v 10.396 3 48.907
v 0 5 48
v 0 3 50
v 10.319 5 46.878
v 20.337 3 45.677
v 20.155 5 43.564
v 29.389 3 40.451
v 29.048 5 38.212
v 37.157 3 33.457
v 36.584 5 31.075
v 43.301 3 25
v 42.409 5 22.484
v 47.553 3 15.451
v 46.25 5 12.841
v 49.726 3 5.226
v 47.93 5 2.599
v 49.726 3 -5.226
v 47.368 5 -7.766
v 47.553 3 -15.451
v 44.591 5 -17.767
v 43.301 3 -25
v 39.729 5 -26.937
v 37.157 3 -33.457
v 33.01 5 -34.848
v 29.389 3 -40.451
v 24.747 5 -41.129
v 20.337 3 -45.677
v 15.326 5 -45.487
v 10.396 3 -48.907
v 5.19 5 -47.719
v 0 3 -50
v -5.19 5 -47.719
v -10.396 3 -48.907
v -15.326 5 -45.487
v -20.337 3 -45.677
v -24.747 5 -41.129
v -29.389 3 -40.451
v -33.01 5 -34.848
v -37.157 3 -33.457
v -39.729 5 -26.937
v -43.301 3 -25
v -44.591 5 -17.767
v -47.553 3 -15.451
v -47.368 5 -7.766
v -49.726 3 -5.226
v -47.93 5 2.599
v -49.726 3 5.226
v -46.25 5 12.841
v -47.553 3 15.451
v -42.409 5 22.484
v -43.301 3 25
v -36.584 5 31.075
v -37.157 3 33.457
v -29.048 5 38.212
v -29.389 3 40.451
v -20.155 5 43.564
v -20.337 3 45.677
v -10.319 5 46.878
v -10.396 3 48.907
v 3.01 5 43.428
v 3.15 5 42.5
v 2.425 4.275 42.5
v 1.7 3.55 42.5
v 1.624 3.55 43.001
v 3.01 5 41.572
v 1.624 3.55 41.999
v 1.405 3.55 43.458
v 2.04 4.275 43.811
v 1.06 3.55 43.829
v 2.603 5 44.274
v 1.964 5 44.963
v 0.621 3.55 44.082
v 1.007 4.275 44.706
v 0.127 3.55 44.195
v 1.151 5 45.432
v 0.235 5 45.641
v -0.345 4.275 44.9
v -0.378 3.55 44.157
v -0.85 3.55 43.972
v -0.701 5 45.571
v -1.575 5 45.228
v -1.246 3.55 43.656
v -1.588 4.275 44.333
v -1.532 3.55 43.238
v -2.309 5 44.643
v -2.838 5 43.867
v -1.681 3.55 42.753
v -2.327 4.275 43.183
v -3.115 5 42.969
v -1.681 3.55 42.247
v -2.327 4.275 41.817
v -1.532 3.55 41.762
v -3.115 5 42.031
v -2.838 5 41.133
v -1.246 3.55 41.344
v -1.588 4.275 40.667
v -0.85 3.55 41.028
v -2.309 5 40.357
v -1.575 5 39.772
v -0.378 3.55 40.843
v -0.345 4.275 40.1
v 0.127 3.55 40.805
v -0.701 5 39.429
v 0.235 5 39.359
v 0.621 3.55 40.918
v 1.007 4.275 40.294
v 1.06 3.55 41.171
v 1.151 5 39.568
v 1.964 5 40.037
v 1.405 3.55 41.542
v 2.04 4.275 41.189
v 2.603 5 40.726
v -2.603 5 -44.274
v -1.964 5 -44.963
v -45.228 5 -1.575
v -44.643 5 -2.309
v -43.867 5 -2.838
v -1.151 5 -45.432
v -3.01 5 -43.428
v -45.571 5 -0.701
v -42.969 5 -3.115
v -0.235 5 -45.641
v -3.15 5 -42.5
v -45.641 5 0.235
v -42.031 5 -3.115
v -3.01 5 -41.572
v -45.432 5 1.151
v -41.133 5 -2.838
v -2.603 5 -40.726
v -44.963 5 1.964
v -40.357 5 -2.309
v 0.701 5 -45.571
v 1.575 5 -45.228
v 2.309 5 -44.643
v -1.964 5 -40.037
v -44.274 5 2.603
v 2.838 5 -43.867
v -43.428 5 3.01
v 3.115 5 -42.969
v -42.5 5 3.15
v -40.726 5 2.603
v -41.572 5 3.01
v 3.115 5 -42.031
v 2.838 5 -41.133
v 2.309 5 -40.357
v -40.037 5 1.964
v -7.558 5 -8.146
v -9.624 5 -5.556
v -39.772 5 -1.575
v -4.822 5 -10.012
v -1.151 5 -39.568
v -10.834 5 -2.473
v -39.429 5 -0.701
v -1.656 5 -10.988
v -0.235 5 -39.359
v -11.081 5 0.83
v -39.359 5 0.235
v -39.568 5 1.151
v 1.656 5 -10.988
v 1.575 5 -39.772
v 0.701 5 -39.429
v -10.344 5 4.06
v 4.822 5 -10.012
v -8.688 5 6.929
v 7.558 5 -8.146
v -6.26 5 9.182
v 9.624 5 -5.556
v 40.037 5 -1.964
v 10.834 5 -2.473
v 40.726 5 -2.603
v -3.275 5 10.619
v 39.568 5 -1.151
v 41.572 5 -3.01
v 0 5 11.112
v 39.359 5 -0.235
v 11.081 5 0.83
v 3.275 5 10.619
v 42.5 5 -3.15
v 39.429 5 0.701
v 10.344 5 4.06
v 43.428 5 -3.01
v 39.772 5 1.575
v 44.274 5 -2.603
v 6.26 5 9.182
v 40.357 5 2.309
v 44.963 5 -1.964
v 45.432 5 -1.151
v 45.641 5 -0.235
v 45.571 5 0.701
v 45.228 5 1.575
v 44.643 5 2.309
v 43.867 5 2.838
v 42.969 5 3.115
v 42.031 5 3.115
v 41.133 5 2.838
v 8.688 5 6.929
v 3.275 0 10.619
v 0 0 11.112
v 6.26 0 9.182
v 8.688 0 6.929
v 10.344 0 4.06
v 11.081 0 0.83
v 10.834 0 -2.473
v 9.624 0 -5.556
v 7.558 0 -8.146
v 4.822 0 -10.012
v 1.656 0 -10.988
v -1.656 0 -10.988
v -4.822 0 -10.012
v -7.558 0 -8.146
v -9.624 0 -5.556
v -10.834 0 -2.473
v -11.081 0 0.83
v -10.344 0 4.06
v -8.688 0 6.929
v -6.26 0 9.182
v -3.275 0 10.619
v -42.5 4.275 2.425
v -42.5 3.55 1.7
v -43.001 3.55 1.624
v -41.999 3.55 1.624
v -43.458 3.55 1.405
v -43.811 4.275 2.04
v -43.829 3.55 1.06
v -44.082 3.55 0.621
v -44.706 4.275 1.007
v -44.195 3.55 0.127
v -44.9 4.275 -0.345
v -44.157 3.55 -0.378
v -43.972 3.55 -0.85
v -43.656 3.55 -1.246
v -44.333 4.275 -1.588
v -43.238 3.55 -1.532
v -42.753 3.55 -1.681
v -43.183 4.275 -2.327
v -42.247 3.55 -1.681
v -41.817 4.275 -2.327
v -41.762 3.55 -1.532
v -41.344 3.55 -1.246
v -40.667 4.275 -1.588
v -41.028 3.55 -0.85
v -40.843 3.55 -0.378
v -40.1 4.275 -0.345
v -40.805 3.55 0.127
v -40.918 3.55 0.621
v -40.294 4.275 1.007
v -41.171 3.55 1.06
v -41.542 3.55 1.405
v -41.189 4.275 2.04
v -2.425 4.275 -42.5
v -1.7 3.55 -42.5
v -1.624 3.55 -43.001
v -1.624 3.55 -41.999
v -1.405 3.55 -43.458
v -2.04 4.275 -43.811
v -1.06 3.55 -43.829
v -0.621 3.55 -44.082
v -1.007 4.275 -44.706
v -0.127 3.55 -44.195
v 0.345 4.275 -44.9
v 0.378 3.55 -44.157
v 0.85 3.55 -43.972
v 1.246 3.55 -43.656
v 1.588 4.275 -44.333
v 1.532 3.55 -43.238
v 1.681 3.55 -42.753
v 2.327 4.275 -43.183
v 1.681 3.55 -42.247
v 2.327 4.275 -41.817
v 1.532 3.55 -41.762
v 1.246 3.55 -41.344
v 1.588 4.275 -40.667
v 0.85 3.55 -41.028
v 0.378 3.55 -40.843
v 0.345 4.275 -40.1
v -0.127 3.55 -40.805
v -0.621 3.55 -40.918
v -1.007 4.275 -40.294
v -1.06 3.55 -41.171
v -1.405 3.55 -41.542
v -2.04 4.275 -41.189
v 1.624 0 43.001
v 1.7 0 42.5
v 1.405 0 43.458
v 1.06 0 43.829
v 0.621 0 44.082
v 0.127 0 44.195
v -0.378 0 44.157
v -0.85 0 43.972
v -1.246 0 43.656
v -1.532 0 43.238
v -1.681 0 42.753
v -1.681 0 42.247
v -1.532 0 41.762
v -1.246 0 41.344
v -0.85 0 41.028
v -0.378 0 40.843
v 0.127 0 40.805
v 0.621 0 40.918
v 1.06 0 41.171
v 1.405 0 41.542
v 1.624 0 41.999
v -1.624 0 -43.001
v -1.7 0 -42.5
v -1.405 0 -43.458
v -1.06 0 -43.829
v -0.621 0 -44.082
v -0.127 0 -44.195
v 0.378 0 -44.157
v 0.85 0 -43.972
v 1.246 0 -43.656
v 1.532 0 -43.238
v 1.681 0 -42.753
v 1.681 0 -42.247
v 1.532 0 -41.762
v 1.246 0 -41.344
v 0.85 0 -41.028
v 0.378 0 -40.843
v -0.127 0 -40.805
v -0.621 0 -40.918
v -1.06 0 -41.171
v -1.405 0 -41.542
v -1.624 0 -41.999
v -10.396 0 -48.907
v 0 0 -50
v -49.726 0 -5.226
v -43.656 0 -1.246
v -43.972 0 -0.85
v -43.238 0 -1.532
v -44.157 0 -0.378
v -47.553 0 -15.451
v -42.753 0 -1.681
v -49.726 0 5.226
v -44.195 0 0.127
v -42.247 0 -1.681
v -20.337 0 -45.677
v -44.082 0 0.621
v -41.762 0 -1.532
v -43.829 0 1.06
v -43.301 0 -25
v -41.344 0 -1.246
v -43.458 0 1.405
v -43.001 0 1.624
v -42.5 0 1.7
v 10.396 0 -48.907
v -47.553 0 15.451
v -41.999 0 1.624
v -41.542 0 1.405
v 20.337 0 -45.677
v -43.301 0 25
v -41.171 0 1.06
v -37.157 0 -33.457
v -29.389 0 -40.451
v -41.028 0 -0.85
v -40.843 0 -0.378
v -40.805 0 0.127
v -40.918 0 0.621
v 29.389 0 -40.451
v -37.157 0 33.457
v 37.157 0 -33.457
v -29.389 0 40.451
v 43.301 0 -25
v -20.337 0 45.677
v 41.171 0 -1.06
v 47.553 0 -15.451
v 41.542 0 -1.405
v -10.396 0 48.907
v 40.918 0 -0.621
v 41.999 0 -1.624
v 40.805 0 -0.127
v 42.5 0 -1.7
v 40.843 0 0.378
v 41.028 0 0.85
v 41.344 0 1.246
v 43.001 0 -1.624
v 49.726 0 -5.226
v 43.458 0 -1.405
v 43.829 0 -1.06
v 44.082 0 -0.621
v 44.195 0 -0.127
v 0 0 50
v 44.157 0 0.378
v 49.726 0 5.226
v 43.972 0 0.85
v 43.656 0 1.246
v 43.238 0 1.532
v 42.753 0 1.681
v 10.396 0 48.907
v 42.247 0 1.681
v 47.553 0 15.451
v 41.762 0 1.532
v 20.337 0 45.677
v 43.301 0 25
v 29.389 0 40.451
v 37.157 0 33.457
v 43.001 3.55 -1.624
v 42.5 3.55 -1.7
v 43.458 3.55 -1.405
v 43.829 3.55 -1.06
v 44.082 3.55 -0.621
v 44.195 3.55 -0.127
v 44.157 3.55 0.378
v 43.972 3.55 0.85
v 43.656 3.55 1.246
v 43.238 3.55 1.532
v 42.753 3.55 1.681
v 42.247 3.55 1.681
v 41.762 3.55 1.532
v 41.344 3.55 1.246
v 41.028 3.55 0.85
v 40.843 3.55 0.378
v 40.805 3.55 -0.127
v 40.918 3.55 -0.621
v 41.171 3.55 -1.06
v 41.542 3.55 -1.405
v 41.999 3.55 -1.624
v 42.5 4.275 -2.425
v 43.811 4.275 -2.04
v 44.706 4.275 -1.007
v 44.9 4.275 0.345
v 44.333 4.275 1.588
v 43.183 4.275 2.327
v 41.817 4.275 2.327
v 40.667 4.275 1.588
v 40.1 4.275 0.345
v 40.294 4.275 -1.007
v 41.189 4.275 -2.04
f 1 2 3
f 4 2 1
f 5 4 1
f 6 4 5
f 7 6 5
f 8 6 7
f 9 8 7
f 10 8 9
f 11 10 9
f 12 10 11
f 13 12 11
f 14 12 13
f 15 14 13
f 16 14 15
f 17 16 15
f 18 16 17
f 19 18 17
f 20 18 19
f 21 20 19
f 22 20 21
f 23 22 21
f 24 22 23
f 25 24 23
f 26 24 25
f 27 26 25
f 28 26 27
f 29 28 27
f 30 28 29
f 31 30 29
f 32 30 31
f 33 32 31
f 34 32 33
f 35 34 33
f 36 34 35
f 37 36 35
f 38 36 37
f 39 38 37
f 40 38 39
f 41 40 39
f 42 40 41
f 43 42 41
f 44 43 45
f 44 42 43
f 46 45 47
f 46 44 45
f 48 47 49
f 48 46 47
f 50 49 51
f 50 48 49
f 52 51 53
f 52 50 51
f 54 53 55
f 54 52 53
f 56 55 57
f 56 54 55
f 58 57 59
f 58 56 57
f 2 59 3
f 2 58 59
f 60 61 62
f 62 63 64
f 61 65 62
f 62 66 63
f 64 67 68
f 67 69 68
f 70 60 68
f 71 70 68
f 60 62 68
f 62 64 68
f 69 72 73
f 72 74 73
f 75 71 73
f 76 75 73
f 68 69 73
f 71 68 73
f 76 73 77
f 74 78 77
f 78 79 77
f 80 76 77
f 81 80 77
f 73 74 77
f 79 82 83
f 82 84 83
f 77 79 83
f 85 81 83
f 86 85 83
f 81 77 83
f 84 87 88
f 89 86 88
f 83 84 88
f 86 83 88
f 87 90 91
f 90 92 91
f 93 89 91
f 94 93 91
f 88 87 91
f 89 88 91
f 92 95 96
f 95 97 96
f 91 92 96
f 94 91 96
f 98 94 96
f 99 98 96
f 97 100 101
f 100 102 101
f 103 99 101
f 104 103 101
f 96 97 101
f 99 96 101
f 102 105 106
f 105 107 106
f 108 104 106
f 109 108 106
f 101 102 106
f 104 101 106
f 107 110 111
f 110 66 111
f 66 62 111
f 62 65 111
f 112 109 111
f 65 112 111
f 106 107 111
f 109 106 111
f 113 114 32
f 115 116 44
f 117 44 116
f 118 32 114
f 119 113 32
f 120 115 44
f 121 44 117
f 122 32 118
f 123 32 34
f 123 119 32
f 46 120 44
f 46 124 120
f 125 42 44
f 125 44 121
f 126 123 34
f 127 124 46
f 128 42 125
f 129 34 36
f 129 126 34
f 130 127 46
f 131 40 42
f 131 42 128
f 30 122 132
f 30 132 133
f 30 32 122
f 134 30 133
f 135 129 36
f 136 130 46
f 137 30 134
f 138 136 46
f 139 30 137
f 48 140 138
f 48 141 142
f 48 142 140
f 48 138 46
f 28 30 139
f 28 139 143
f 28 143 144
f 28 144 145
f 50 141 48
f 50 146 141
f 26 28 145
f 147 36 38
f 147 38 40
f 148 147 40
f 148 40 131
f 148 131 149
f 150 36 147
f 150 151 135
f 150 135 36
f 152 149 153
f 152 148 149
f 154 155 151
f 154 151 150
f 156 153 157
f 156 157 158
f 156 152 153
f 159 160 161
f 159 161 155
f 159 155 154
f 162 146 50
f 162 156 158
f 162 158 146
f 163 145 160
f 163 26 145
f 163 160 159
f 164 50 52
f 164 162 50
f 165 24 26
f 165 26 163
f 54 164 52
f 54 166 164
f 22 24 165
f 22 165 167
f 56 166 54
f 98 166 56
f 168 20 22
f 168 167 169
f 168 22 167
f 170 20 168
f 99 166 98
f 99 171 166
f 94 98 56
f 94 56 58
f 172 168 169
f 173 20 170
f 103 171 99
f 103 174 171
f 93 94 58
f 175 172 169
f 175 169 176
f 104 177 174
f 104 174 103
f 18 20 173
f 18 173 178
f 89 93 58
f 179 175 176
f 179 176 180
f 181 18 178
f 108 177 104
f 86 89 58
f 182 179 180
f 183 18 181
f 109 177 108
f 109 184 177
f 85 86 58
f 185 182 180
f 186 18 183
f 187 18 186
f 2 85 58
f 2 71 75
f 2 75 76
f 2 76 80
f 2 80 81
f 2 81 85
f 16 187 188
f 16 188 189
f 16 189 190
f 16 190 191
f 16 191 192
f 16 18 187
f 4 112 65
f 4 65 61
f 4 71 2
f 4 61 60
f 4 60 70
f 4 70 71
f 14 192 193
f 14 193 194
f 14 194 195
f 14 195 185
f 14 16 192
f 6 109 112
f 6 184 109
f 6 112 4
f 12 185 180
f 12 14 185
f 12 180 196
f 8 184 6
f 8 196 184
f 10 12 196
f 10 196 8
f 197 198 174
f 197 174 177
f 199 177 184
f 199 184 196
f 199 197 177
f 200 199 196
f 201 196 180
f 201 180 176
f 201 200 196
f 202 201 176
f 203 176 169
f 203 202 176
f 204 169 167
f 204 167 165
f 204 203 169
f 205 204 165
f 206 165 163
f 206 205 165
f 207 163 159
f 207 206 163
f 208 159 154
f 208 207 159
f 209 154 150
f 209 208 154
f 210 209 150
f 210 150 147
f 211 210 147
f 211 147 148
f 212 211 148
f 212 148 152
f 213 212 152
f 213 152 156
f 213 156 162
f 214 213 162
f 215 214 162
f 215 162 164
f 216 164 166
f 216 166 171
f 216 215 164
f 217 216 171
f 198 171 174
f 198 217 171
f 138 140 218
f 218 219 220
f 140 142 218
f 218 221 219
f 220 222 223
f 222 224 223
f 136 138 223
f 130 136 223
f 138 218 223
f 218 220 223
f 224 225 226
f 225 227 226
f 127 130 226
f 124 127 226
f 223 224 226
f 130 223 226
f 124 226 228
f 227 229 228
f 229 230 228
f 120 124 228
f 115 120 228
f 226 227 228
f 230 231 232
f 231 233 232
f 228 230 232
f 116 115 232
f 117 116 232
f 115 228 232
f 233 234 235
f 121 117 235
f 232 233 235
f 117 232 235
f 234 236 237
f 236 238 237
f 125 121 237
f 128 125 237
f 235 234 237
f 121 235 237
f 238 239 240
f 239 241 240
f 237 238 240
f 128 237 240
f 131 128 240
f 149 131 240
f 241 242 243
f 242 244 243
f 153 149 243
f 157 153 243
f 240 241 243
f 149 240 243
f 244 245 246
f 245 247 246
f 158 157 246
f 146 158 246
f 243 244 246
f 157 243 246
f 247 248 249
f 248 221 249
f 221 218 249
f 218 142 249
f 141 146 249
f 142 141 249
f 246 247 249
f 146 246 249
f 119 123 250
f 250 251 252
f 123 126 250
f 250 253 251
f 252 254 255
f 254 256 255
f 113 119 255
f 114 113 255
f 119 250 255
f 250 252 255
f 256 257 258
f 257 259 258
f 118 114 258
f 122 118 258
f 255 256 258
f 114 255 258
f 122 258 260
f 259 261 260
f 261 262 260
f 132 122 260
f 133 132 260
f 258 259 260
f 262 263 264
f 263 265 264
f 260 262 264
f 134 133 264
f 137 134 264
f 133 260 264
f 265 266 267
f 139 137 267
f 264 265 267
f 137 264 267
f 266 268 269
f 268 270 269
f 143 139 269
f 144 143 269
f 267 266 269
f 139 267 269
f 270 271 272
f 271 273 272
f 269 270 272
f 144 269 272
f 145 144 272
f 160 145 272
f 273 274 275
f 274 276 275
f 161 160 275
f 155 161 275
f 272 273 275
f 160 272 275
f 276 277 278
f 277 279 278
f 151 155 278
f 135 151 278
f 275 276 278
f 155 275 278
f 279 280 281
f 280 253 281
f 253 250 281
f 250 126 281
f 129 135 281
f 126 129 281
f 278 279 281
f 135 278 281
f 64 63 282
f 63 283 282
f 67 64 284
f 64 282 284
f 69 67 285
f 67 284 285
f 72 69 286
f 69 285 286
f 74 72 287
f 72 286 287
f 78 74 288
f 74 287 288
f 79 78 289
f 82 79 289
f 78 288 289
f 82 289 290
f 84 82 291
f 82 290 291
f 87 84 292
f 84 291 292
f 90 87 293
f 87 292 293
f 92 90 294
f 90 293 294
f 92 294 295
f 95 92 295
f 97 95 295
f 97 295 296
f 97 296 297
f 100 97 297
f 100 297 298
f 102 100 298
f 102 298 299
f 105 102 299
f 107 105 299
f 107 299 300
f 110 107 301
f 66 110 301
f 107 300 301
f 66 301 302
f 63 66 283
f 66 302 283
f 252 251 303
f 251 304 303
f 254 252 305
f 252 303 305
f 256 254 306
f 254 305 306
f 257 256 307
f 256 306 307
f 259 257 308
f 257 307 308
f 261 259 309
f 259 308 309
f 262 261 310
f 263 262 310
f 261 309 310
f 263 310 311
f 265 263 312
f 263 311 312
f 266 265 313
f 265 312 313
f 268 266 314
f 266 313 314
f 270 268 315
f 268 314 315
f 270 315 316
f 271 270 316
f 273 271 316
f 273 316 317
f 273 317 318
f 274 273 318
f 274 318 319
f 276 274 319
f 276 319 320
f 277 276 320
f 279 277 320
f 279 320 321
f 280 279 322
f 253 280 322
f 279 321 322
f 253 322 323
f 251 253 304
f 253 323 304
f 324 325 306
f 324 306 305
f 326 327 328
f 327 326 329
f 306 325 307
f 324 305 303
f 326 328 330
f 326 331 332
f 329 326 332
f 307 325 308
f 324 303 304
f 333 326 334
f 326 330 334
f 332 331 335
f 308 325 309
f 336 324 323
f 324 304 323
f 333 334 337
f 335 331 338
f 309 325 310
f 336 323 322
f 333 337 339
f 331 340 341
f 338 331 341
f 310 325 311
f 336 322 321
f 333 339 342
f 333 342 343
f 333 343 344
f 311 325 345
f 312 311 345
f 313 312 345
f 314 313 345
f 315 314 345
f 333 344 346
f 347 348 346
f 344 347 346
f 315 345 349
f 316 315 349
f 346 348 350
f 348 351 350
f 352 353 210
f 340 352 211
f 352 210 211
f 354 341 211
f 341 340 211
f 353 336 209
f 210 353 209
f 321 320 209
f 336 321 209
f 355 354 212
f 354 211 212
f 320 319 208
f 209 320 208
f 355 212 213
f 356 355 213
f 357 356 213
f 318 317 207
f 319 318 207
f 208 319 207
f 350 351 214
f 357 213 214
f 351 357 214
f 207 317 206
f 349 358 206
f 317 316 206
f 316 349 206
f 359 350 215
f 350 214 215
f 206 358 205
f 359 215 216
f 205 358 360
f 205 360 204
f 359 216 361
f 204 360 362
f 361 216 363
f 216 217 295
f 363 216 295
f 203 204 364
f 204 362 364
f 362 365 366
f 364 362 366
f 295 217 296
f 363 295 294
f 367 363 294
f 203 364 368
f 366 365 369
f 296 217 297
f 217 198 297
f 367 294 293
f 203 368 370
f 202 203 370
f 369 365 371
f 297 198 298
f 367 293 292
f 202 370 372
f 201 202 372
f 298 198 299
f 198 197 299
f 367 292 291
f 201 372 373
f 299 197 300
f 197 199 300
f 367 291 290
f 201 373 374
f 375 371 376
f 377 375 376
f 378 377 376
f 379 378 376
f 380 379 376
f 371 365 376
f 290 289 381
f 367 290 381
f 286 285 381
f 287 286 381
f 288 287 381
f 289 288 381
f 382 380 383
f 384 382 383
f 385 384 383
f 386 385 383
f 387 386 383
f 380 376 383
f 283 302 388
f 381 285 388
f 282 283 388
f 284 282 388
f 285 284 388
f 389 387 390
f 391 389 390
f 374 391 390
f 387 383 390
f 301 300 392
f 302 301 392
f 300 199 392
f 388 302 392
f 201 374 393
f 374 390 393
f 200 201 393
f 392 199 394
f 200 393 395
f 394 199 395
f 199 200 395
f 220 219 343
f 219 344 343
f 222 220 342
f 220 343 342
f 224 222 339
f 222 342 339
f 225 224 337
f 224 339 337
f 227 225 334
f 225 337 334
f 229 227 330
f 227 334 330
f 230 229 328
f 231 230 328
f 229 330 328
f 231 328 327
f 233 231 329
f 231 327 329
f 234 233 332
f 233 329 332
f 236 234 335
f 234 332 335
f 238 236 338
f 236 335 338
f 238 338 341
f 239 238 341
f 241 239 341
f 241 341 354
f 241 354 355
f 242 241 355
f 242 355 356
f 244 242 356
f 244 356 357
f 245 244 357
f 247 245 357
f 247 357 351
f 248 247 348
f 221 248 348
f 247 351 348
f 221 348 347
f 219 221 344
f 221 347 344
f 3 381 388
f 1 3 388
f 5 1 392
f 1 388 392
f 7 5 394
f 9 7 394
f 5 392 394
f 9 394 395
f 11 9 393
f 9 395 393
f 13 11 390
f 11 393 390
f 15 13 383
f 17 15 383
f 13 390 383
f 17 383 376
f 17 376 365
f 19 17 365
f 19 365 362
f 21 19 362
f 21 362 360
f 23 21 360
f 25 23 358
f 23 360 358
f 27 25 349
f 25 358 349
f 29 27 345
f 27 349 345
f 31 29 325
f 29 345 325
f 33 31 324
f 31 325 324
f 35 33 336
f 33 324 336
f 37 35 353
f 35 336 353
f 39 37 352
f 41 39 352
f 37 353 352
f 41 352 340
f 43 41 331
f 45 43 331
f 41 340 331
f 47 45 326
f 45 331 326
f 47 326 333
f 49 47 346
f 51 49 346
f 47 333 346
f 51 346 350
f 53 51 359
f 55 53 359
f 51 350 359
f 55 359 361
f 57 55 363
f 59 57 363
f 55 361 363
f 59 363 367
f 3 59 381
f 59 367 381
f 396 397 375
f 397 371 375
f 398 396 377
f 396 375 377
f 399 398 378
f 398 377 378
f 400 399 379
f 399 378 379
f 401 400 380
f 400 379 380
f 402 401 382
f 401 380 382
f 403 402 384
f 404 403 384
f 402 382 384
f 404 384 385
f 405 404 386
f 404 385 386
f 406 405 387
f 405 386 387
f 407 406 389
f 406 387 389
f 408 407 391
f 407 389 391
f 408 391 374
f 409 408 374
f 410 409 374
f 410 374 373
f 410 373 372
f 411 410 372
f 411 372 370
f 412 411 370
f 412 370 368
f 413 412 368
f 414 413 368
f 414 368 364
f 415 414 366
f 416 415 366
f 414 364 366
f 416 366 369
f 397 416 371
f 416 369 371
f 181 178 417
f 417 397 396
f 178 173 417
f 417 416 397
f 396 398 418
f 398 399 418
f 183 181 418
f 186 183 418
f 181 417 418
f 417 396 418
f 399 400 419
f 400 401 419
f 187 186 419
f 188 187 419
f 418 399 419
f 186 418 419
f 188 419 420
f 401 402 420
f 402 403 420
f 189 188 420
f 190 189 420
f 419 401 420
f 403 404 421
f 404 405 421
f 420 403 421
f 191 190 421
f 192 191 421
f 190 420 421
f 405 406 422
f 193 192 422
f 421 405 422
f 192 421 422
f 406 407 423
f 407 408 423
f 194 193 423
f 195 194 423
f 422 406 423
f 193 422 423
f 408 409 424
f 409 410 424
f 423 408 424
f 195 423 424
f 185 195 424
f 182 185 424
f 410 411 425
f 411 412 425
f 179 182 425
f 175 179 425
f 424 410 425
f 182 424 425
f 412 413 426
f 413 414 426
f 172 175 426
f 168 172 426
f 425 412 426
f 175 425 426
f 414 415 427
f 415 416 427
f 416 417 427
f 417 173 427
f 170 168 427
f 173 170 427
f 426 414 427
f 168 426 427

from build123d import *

# Parameters (mm, degrees)
SKETCH1_R                                       = 50
SKETCH1_R_2                                     = 11.1125
BOSS_EXTRUDE1_DEPTH                             = 5
CSK_FOR_M3_FLAT_HEAD_MACHINE_SCREW1_D           = 3.4
CSK_FOR_M3_FLAT_HEAD_MACHINE_SCREW1_CSINK_D     = 6.3
CSK_FOR_M3_FLAT_HEAD_MACHINE_SCREW1_CSINK_ANGLE = 90
CIRPATTERN1_COUNT                               = 4
CHAMFER1_SIZE                                   = 2


with BuildPart() as part:
    # Sketch1 → Boss-Extrude1 (new body)
    with BuildSketch(Plane(origin=(0, 0, 0), x_dir=(1, 0, 0), z_dir=(0, 1, 0))):
        with Locations(Location((0, 0, 0), (0, 0, 270))):
            Circle(SKETCH1_R)
        with Locations(Location((0, 0, 0), (0, 0, 270))):
            Circle(SKETCH1_R_2, mode=Mode.SUBTRACT)
    extrude(amount=BOSS_EXTRUDE1_DEPTH)

    # CSK for M3 Flat Head Machine Screw1 (through all)
    with Locations(Plane(origin=(0, 5, 0), x_dir=(1, 0, 0), z_dir=(0, 1, 0))):
        with Locations((0, 42.5)):
            csk_for_m3_flat_head_machine_screw1 = CounterSinkHole(CSK_FOR_M3_FLAT_HEAD_MACHINE_SCREW1_D / 2, CSK_FOR_M3_FLAT_HEAD_MACHINE_SCREW1_CSINK_D / 2, counter_sink_angle=CSK_FOR_M3_FLAT_HEAD_MACHINE_SCREW1_CSINK_ANGLE)

    # CirPattern1: CSK for M3 Flat Head Machine Screw1 ×4 about axis
    cirpattern1_axis = Axis((0, 0, 0), (0, 1, 0))
    for i in range(1, CIRPATTERN1_COUNT):
        add(csk_for_m3_flat_head_machine_screw1.rotate(cirpattern1_axis, i * 360 / CIRPATTERN1_COUNT), mode=Mode.SUBTRACT)

    # Chamfer1
    chamfer1_edges = [part.edges().sort_by_distance(p)[0] for p in [
        (0, 5, -50),
    ]]
    chamfer(chamfer1_edges, length=CHAMFER1_SIZE)


solid = part.part
